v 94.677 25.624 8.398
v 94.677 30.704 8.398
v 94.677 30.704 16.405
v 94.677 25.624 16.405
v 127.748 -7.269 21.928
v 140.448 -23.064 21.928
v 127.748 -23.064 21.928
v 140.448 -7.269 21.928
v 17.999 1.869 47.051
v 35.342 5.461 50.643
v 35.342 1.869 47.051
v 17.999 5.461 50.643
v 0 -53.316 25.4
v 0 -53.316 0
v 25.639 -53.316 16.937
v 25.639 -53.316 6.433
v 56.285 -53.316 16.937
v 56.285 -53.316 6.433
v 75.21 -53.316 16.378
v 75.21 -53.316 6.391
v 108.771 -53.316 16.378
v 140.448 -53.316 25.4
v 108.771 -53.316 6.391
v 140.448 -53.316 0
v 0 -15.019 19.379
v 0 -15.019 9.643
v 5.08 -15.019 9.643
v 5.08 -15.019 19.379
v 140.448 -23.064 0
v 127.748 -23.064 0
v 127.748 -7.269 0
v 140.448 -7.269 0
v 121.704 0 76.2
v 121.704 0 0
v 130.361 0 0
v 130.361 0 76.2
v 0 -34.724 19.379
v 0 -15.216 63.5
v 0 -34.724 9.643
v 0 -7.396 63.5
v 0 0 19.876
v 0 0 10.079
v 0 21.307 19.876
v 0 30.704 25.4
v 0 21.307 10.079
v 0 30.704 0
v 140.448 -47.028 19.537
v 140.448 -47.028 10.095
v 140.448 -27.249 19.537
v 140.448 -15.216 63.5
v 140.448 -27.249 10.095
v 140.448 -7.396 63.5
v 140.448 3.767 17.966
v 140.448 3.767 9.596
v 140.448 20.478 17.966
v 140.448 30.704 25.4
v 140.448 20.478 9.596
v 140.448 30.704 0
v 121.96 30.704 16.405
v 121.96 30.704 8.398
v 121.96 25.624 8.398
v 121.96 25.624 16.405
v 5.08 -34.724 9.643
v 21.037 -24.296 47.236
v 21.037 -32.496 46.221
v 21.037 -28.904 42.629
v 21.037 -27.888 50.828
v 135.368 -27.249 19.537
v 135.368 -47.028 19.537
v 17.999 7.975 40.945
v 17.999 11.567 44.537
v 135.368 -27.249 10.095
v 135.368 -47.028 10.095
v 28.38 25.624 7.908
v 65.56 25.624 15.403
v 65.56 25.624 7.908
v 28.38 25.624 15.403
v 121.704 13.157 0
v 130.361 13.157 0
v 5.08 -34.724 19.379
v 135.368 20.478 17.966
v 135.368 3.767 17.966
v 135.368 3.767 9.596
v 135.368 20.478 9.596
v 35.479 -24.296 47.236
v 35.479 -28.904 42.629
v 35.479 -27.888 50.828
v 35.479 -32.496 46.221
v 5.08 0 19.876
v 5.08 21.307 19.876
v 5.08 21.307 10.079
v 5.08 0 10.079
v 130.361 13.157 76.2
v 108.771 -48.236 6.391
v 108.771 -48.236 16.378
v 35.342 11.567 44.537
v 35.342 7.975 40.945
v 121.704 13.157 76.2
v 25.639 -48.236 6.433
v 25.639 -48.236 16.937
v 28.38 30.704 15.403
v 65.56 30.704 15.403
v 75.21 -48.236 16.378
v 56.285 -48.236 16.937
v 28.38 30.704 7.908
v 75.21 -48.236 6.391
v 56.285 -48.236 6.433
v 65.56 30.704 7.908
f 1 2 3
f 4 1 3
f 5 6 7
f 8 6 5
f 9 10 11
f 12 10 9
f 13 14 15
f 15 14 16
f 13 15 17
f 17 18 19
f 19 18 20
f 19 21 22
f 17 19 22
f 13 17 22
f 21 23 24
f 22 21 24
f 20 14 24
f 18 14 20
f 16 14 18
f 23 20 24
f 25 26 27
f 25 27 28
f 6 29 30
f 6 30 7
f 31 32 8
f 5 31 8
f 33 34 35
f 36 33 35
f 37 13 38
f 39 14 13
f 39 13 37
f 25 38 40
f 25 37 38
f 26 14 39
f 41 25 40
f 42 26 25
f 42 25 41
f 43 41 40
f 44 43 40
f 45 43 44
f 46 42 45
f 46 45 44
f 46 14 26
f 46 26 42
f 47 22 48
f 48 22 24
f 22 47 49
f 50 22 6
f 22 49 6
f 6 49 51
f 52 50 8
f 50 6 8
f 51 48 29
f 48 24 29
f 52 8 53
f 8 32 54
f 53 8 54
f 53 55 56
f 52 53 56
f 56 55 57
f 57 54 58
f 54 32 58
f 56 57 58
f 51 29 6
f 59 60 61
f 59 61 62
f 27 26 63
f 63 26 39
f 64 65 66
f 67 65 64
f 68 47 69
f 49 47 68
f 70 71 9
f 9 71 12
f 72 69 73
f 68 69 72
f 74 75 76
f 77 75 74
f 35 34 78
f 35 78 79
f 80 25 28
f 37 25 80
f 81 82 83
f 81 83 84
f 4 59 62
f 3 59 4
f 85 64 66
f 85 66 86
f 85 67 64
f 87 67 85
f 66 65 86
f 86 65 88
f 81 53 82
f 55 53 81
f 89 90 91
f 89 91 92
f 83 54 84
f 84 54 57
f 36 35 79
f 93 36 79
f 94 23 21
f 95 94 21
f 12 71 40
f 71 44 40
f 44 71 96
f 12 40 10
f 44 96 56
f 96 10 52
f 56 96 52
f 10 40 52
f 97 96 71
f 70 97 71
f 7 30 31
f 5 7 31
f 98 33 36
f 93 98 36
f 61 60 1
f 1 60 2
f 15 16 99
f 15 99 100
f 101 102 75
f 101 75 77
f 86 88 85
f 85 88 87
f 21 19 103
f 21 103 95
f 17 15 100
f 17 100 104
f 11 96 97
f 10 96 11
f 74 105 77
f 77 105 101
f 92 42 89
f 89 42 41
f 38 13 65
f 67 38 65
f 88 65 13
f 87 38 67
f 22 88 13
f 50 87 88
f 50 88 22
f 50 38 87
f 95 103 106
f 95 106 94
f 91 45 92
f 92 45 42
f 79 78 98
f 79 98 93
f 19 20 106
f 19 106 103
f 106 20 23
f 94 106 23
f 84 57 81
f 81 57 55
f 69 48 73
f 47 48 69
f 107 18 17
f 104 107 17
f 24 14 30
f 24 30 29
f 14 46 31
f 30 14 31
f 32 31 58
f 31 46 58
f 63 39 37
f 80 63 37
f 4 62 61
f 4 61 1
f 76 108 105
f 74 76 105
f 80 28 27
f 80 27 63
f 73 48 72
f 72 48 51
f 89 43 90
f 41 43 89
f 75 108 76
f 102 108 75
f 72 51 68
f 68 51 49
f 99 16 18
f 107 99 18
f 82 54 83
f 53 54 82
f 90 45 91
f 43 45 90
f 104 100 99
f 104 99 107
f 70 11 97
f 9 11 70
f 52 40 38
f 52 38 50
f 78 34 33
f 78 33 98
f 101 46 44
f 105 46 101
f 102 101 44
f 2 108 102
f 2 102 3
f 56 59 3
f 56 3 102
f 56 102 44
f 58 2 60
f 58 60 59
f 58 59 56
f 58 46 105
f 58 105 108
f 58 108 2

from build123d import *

# Parameters (mm, degrees)
F0_W      = 140.4484510422
F0_H      = 84.0201452374
F1_DEPTH  = 63.5
F2_SIZE   = 38.1
F3_W      = 8.6570605636
F3_H      = 13.1569579244
F4_DEPTH  = 76.2
F6_W      = 15.7950655557
F6_H      = 21.9281148165
F7_DEPTH  = 12.7
F11_W     = 16.7103528511
F11_H     = 8.3694644272
F12_DEPTH = 5.08
F13_W     = 19.7787024081
F13_H     = 9.4418320805
F14_DEPTH = 5.08
F15_W     = 30.6456126273
F15_H     = 10.5041540228
F16_DEPTH = 5.08
F17_W     = 33.5607007146
F17_H     = 9.9876374006
F18_DEPTH = 5.08
F19_W     = 21.3066544384
F19_H     = 9.7970152274
F20_DEPTH = 5.08
F21_W     = 19.7049863636
F21_H     = 9.7357481718
F22_DEPTH = 5.08
F23_W     = 27.2831916809
F23_H     = 8.0071371049
F24_DEPTH = 5.08
F25_W     = 37.1795129031
F25_H     = 7.4951220304
F26_DEPTH = 5.08
F27_W     = 14.4418329
F27_H     = 6.516110152
F28_DEPTH = 5.08
F29_W     = 17.3427406698
F29_H     = 8.6352974176
F30_DEPTH = 5.08


# Not quite as in the source:
# - the program builds the solid bodies; features that only make, move or delete a surface that nothing else refers to are left out


with BuildPart() as f1:
    # F0 (on Top) → F1 (new body)
    with BuildSketch(Plane.XY):
        with Locations((70.2242255211, -11.3064013422)):
            Rectangle(F0_W, F0_H)
    extrude(amount=F1_DEPTH)

    # F2
    f2_edges = [f1.edges().sort_by_distance(p)[0] for p in [
        (70.224226, -53.316474, 63.5),
        (70.224226, 30.703671, 63.5),
    ]]
    chamfer(f2_edges, length=F2_SIZE)

    # F6 (on face) → F7 (cut)
    with BuildSketch(Plane.YZ.offset(140.4484510422)):
        with Locations((-15.1667564642, 10.9640574083)):
            Rectangle(F6_W, F6_H)
    extrude(amount=-F7_DEPTH, mode=Mode.SUBTRACT)

    # F11 (on face) → F12 (cut)
    with BuildSketch(Plane.YZ.offset(140.4484510422)):
        with Locations((12.1226046467, 13.7810688466)):
            Rectangle(F11_W, F11_H)
    extrude(amount=-F12_DEPTH, mode=Mode.SUBTRACT)

    # F13 (on face) → F14 (cut)
    with BuildSketch(Plane.YZ.offset(140.4484510422)):
        with Locations((-37.1385682374, 14.8160951212)):
            Rectangle(F13_W, F13_H)
    extrude(amount=-F14_DEPTH, mode=Mode.SUBTRACT)

    # F15 (on face) → F16 (cut)
    with BuildSketch(Plane.XZ.offset(53.3164739609)):
        with Locations((40.9622769803, 11.6851397324)):
            Rectangle(F15_W, F15_H)
    extrude(amount=-F16_DEPTH, mode=Mode.SUBTRACT)

    # F17 (on face) → F18 (cut)
    with BuildSketch(Plane.XZ.offset(53.3164739609)):
        with Locations((91.9907130301, 11.3846212626)):
            Rectangle(F17_W, F17_H)
    extrude(amount=-F18_DEPTH, mode=Mode.SUBTRACT)

    # F19 (on face) → F20 (cut)
    with BuildSketch(Plane(origin=(0, 0, 0), x_dir=(0, -1, 0), z_dir=(-1, 0, 0))):
        with Locations((-10.6533272192, 14.9779669009)):
            Rectangle(F19_W, F19_H)
    extrude(amount=-F20_DEPTH, mode=Mode.SUBTRACT)

    # F21 (on face) → F22 (cut)
    with BuildSketch(Plane(origin=(0, 0, 0), x_dir=(0, -1, 0), z_dir=(-1, 0, 0))):
        with Locations((24.8714331537, 14.5110972226)):
            Rectangle(F21_W, F21_H)
    extrude(amount=-F22_DEPTH, mode=Mode.SUBTRACT)

    # F23 (on face) → F24 (cut)
    with BuildSketch(Plane(origin=(0, 30.7036712766, 0), x_dir=(-1, 0, 0), z_dir=(0, 1, 0))):
        with Locations((-108.3185896277, 12.4019039795)):
            Rectangle(F23_W, F23_H)
    extrude(amount=-F24_DEPTH, mode=Mode.SUBTRACT)

    # F25 (on face) → F26 (cut)
    with BuildSketch(Plane(origin=(0, 30.7036712766, 0), x_dir=(-1, 0, 0), z_dir=(0, 1, 0))):
        with Locations((-46.9700554386, 11.6554377601)):
            Rectangle(F25_W, F25_H)
    extrude(amount=-F26_DEPTH, mode=Mode.SUBTRACT)

    # F27 (on face) → F28 (cut)
    with BuildSketch(Plane(origin=(0, -39.3582369804, 39.3582369804), x_dir=(1, 0, 0), z_dir=(0, -0.7071067812, 0.7071067812))):
        with Locations((28.2577574253, 12.9630696028)):
            Rectangle(F27_W, F27_H)
    extrude(amount=-F28_DEPTH, mode=Mode.SUBTRACT)

    # F29 (on face) → F30 (cut)
    with BuildSketch(Plane(origin=(0, 28.0518356383, 28.0518356383), x_dir=(-1, 0, 0), z_dir=(0, 0.7071067812, 0.7071067812))):
        with Locations((-26.6702575609, 27.6306420565)):
            Rectangle(F29_W, F29_H)
    extrude(amount=-F30_DEPTH, mode=Mode.SUBTRACT)


with BuildPart() as f4:
    # F3 (on Top) → F4 (new body)
    with BuildSketch(Plane.XY):
        with Locations((126.0326392949, 6.5784789622)):
            Rectangle(F3_W, F3_H)
    extrude(amount=F4_DEPTH)


solid = Compound([f1.part, f4.part])
